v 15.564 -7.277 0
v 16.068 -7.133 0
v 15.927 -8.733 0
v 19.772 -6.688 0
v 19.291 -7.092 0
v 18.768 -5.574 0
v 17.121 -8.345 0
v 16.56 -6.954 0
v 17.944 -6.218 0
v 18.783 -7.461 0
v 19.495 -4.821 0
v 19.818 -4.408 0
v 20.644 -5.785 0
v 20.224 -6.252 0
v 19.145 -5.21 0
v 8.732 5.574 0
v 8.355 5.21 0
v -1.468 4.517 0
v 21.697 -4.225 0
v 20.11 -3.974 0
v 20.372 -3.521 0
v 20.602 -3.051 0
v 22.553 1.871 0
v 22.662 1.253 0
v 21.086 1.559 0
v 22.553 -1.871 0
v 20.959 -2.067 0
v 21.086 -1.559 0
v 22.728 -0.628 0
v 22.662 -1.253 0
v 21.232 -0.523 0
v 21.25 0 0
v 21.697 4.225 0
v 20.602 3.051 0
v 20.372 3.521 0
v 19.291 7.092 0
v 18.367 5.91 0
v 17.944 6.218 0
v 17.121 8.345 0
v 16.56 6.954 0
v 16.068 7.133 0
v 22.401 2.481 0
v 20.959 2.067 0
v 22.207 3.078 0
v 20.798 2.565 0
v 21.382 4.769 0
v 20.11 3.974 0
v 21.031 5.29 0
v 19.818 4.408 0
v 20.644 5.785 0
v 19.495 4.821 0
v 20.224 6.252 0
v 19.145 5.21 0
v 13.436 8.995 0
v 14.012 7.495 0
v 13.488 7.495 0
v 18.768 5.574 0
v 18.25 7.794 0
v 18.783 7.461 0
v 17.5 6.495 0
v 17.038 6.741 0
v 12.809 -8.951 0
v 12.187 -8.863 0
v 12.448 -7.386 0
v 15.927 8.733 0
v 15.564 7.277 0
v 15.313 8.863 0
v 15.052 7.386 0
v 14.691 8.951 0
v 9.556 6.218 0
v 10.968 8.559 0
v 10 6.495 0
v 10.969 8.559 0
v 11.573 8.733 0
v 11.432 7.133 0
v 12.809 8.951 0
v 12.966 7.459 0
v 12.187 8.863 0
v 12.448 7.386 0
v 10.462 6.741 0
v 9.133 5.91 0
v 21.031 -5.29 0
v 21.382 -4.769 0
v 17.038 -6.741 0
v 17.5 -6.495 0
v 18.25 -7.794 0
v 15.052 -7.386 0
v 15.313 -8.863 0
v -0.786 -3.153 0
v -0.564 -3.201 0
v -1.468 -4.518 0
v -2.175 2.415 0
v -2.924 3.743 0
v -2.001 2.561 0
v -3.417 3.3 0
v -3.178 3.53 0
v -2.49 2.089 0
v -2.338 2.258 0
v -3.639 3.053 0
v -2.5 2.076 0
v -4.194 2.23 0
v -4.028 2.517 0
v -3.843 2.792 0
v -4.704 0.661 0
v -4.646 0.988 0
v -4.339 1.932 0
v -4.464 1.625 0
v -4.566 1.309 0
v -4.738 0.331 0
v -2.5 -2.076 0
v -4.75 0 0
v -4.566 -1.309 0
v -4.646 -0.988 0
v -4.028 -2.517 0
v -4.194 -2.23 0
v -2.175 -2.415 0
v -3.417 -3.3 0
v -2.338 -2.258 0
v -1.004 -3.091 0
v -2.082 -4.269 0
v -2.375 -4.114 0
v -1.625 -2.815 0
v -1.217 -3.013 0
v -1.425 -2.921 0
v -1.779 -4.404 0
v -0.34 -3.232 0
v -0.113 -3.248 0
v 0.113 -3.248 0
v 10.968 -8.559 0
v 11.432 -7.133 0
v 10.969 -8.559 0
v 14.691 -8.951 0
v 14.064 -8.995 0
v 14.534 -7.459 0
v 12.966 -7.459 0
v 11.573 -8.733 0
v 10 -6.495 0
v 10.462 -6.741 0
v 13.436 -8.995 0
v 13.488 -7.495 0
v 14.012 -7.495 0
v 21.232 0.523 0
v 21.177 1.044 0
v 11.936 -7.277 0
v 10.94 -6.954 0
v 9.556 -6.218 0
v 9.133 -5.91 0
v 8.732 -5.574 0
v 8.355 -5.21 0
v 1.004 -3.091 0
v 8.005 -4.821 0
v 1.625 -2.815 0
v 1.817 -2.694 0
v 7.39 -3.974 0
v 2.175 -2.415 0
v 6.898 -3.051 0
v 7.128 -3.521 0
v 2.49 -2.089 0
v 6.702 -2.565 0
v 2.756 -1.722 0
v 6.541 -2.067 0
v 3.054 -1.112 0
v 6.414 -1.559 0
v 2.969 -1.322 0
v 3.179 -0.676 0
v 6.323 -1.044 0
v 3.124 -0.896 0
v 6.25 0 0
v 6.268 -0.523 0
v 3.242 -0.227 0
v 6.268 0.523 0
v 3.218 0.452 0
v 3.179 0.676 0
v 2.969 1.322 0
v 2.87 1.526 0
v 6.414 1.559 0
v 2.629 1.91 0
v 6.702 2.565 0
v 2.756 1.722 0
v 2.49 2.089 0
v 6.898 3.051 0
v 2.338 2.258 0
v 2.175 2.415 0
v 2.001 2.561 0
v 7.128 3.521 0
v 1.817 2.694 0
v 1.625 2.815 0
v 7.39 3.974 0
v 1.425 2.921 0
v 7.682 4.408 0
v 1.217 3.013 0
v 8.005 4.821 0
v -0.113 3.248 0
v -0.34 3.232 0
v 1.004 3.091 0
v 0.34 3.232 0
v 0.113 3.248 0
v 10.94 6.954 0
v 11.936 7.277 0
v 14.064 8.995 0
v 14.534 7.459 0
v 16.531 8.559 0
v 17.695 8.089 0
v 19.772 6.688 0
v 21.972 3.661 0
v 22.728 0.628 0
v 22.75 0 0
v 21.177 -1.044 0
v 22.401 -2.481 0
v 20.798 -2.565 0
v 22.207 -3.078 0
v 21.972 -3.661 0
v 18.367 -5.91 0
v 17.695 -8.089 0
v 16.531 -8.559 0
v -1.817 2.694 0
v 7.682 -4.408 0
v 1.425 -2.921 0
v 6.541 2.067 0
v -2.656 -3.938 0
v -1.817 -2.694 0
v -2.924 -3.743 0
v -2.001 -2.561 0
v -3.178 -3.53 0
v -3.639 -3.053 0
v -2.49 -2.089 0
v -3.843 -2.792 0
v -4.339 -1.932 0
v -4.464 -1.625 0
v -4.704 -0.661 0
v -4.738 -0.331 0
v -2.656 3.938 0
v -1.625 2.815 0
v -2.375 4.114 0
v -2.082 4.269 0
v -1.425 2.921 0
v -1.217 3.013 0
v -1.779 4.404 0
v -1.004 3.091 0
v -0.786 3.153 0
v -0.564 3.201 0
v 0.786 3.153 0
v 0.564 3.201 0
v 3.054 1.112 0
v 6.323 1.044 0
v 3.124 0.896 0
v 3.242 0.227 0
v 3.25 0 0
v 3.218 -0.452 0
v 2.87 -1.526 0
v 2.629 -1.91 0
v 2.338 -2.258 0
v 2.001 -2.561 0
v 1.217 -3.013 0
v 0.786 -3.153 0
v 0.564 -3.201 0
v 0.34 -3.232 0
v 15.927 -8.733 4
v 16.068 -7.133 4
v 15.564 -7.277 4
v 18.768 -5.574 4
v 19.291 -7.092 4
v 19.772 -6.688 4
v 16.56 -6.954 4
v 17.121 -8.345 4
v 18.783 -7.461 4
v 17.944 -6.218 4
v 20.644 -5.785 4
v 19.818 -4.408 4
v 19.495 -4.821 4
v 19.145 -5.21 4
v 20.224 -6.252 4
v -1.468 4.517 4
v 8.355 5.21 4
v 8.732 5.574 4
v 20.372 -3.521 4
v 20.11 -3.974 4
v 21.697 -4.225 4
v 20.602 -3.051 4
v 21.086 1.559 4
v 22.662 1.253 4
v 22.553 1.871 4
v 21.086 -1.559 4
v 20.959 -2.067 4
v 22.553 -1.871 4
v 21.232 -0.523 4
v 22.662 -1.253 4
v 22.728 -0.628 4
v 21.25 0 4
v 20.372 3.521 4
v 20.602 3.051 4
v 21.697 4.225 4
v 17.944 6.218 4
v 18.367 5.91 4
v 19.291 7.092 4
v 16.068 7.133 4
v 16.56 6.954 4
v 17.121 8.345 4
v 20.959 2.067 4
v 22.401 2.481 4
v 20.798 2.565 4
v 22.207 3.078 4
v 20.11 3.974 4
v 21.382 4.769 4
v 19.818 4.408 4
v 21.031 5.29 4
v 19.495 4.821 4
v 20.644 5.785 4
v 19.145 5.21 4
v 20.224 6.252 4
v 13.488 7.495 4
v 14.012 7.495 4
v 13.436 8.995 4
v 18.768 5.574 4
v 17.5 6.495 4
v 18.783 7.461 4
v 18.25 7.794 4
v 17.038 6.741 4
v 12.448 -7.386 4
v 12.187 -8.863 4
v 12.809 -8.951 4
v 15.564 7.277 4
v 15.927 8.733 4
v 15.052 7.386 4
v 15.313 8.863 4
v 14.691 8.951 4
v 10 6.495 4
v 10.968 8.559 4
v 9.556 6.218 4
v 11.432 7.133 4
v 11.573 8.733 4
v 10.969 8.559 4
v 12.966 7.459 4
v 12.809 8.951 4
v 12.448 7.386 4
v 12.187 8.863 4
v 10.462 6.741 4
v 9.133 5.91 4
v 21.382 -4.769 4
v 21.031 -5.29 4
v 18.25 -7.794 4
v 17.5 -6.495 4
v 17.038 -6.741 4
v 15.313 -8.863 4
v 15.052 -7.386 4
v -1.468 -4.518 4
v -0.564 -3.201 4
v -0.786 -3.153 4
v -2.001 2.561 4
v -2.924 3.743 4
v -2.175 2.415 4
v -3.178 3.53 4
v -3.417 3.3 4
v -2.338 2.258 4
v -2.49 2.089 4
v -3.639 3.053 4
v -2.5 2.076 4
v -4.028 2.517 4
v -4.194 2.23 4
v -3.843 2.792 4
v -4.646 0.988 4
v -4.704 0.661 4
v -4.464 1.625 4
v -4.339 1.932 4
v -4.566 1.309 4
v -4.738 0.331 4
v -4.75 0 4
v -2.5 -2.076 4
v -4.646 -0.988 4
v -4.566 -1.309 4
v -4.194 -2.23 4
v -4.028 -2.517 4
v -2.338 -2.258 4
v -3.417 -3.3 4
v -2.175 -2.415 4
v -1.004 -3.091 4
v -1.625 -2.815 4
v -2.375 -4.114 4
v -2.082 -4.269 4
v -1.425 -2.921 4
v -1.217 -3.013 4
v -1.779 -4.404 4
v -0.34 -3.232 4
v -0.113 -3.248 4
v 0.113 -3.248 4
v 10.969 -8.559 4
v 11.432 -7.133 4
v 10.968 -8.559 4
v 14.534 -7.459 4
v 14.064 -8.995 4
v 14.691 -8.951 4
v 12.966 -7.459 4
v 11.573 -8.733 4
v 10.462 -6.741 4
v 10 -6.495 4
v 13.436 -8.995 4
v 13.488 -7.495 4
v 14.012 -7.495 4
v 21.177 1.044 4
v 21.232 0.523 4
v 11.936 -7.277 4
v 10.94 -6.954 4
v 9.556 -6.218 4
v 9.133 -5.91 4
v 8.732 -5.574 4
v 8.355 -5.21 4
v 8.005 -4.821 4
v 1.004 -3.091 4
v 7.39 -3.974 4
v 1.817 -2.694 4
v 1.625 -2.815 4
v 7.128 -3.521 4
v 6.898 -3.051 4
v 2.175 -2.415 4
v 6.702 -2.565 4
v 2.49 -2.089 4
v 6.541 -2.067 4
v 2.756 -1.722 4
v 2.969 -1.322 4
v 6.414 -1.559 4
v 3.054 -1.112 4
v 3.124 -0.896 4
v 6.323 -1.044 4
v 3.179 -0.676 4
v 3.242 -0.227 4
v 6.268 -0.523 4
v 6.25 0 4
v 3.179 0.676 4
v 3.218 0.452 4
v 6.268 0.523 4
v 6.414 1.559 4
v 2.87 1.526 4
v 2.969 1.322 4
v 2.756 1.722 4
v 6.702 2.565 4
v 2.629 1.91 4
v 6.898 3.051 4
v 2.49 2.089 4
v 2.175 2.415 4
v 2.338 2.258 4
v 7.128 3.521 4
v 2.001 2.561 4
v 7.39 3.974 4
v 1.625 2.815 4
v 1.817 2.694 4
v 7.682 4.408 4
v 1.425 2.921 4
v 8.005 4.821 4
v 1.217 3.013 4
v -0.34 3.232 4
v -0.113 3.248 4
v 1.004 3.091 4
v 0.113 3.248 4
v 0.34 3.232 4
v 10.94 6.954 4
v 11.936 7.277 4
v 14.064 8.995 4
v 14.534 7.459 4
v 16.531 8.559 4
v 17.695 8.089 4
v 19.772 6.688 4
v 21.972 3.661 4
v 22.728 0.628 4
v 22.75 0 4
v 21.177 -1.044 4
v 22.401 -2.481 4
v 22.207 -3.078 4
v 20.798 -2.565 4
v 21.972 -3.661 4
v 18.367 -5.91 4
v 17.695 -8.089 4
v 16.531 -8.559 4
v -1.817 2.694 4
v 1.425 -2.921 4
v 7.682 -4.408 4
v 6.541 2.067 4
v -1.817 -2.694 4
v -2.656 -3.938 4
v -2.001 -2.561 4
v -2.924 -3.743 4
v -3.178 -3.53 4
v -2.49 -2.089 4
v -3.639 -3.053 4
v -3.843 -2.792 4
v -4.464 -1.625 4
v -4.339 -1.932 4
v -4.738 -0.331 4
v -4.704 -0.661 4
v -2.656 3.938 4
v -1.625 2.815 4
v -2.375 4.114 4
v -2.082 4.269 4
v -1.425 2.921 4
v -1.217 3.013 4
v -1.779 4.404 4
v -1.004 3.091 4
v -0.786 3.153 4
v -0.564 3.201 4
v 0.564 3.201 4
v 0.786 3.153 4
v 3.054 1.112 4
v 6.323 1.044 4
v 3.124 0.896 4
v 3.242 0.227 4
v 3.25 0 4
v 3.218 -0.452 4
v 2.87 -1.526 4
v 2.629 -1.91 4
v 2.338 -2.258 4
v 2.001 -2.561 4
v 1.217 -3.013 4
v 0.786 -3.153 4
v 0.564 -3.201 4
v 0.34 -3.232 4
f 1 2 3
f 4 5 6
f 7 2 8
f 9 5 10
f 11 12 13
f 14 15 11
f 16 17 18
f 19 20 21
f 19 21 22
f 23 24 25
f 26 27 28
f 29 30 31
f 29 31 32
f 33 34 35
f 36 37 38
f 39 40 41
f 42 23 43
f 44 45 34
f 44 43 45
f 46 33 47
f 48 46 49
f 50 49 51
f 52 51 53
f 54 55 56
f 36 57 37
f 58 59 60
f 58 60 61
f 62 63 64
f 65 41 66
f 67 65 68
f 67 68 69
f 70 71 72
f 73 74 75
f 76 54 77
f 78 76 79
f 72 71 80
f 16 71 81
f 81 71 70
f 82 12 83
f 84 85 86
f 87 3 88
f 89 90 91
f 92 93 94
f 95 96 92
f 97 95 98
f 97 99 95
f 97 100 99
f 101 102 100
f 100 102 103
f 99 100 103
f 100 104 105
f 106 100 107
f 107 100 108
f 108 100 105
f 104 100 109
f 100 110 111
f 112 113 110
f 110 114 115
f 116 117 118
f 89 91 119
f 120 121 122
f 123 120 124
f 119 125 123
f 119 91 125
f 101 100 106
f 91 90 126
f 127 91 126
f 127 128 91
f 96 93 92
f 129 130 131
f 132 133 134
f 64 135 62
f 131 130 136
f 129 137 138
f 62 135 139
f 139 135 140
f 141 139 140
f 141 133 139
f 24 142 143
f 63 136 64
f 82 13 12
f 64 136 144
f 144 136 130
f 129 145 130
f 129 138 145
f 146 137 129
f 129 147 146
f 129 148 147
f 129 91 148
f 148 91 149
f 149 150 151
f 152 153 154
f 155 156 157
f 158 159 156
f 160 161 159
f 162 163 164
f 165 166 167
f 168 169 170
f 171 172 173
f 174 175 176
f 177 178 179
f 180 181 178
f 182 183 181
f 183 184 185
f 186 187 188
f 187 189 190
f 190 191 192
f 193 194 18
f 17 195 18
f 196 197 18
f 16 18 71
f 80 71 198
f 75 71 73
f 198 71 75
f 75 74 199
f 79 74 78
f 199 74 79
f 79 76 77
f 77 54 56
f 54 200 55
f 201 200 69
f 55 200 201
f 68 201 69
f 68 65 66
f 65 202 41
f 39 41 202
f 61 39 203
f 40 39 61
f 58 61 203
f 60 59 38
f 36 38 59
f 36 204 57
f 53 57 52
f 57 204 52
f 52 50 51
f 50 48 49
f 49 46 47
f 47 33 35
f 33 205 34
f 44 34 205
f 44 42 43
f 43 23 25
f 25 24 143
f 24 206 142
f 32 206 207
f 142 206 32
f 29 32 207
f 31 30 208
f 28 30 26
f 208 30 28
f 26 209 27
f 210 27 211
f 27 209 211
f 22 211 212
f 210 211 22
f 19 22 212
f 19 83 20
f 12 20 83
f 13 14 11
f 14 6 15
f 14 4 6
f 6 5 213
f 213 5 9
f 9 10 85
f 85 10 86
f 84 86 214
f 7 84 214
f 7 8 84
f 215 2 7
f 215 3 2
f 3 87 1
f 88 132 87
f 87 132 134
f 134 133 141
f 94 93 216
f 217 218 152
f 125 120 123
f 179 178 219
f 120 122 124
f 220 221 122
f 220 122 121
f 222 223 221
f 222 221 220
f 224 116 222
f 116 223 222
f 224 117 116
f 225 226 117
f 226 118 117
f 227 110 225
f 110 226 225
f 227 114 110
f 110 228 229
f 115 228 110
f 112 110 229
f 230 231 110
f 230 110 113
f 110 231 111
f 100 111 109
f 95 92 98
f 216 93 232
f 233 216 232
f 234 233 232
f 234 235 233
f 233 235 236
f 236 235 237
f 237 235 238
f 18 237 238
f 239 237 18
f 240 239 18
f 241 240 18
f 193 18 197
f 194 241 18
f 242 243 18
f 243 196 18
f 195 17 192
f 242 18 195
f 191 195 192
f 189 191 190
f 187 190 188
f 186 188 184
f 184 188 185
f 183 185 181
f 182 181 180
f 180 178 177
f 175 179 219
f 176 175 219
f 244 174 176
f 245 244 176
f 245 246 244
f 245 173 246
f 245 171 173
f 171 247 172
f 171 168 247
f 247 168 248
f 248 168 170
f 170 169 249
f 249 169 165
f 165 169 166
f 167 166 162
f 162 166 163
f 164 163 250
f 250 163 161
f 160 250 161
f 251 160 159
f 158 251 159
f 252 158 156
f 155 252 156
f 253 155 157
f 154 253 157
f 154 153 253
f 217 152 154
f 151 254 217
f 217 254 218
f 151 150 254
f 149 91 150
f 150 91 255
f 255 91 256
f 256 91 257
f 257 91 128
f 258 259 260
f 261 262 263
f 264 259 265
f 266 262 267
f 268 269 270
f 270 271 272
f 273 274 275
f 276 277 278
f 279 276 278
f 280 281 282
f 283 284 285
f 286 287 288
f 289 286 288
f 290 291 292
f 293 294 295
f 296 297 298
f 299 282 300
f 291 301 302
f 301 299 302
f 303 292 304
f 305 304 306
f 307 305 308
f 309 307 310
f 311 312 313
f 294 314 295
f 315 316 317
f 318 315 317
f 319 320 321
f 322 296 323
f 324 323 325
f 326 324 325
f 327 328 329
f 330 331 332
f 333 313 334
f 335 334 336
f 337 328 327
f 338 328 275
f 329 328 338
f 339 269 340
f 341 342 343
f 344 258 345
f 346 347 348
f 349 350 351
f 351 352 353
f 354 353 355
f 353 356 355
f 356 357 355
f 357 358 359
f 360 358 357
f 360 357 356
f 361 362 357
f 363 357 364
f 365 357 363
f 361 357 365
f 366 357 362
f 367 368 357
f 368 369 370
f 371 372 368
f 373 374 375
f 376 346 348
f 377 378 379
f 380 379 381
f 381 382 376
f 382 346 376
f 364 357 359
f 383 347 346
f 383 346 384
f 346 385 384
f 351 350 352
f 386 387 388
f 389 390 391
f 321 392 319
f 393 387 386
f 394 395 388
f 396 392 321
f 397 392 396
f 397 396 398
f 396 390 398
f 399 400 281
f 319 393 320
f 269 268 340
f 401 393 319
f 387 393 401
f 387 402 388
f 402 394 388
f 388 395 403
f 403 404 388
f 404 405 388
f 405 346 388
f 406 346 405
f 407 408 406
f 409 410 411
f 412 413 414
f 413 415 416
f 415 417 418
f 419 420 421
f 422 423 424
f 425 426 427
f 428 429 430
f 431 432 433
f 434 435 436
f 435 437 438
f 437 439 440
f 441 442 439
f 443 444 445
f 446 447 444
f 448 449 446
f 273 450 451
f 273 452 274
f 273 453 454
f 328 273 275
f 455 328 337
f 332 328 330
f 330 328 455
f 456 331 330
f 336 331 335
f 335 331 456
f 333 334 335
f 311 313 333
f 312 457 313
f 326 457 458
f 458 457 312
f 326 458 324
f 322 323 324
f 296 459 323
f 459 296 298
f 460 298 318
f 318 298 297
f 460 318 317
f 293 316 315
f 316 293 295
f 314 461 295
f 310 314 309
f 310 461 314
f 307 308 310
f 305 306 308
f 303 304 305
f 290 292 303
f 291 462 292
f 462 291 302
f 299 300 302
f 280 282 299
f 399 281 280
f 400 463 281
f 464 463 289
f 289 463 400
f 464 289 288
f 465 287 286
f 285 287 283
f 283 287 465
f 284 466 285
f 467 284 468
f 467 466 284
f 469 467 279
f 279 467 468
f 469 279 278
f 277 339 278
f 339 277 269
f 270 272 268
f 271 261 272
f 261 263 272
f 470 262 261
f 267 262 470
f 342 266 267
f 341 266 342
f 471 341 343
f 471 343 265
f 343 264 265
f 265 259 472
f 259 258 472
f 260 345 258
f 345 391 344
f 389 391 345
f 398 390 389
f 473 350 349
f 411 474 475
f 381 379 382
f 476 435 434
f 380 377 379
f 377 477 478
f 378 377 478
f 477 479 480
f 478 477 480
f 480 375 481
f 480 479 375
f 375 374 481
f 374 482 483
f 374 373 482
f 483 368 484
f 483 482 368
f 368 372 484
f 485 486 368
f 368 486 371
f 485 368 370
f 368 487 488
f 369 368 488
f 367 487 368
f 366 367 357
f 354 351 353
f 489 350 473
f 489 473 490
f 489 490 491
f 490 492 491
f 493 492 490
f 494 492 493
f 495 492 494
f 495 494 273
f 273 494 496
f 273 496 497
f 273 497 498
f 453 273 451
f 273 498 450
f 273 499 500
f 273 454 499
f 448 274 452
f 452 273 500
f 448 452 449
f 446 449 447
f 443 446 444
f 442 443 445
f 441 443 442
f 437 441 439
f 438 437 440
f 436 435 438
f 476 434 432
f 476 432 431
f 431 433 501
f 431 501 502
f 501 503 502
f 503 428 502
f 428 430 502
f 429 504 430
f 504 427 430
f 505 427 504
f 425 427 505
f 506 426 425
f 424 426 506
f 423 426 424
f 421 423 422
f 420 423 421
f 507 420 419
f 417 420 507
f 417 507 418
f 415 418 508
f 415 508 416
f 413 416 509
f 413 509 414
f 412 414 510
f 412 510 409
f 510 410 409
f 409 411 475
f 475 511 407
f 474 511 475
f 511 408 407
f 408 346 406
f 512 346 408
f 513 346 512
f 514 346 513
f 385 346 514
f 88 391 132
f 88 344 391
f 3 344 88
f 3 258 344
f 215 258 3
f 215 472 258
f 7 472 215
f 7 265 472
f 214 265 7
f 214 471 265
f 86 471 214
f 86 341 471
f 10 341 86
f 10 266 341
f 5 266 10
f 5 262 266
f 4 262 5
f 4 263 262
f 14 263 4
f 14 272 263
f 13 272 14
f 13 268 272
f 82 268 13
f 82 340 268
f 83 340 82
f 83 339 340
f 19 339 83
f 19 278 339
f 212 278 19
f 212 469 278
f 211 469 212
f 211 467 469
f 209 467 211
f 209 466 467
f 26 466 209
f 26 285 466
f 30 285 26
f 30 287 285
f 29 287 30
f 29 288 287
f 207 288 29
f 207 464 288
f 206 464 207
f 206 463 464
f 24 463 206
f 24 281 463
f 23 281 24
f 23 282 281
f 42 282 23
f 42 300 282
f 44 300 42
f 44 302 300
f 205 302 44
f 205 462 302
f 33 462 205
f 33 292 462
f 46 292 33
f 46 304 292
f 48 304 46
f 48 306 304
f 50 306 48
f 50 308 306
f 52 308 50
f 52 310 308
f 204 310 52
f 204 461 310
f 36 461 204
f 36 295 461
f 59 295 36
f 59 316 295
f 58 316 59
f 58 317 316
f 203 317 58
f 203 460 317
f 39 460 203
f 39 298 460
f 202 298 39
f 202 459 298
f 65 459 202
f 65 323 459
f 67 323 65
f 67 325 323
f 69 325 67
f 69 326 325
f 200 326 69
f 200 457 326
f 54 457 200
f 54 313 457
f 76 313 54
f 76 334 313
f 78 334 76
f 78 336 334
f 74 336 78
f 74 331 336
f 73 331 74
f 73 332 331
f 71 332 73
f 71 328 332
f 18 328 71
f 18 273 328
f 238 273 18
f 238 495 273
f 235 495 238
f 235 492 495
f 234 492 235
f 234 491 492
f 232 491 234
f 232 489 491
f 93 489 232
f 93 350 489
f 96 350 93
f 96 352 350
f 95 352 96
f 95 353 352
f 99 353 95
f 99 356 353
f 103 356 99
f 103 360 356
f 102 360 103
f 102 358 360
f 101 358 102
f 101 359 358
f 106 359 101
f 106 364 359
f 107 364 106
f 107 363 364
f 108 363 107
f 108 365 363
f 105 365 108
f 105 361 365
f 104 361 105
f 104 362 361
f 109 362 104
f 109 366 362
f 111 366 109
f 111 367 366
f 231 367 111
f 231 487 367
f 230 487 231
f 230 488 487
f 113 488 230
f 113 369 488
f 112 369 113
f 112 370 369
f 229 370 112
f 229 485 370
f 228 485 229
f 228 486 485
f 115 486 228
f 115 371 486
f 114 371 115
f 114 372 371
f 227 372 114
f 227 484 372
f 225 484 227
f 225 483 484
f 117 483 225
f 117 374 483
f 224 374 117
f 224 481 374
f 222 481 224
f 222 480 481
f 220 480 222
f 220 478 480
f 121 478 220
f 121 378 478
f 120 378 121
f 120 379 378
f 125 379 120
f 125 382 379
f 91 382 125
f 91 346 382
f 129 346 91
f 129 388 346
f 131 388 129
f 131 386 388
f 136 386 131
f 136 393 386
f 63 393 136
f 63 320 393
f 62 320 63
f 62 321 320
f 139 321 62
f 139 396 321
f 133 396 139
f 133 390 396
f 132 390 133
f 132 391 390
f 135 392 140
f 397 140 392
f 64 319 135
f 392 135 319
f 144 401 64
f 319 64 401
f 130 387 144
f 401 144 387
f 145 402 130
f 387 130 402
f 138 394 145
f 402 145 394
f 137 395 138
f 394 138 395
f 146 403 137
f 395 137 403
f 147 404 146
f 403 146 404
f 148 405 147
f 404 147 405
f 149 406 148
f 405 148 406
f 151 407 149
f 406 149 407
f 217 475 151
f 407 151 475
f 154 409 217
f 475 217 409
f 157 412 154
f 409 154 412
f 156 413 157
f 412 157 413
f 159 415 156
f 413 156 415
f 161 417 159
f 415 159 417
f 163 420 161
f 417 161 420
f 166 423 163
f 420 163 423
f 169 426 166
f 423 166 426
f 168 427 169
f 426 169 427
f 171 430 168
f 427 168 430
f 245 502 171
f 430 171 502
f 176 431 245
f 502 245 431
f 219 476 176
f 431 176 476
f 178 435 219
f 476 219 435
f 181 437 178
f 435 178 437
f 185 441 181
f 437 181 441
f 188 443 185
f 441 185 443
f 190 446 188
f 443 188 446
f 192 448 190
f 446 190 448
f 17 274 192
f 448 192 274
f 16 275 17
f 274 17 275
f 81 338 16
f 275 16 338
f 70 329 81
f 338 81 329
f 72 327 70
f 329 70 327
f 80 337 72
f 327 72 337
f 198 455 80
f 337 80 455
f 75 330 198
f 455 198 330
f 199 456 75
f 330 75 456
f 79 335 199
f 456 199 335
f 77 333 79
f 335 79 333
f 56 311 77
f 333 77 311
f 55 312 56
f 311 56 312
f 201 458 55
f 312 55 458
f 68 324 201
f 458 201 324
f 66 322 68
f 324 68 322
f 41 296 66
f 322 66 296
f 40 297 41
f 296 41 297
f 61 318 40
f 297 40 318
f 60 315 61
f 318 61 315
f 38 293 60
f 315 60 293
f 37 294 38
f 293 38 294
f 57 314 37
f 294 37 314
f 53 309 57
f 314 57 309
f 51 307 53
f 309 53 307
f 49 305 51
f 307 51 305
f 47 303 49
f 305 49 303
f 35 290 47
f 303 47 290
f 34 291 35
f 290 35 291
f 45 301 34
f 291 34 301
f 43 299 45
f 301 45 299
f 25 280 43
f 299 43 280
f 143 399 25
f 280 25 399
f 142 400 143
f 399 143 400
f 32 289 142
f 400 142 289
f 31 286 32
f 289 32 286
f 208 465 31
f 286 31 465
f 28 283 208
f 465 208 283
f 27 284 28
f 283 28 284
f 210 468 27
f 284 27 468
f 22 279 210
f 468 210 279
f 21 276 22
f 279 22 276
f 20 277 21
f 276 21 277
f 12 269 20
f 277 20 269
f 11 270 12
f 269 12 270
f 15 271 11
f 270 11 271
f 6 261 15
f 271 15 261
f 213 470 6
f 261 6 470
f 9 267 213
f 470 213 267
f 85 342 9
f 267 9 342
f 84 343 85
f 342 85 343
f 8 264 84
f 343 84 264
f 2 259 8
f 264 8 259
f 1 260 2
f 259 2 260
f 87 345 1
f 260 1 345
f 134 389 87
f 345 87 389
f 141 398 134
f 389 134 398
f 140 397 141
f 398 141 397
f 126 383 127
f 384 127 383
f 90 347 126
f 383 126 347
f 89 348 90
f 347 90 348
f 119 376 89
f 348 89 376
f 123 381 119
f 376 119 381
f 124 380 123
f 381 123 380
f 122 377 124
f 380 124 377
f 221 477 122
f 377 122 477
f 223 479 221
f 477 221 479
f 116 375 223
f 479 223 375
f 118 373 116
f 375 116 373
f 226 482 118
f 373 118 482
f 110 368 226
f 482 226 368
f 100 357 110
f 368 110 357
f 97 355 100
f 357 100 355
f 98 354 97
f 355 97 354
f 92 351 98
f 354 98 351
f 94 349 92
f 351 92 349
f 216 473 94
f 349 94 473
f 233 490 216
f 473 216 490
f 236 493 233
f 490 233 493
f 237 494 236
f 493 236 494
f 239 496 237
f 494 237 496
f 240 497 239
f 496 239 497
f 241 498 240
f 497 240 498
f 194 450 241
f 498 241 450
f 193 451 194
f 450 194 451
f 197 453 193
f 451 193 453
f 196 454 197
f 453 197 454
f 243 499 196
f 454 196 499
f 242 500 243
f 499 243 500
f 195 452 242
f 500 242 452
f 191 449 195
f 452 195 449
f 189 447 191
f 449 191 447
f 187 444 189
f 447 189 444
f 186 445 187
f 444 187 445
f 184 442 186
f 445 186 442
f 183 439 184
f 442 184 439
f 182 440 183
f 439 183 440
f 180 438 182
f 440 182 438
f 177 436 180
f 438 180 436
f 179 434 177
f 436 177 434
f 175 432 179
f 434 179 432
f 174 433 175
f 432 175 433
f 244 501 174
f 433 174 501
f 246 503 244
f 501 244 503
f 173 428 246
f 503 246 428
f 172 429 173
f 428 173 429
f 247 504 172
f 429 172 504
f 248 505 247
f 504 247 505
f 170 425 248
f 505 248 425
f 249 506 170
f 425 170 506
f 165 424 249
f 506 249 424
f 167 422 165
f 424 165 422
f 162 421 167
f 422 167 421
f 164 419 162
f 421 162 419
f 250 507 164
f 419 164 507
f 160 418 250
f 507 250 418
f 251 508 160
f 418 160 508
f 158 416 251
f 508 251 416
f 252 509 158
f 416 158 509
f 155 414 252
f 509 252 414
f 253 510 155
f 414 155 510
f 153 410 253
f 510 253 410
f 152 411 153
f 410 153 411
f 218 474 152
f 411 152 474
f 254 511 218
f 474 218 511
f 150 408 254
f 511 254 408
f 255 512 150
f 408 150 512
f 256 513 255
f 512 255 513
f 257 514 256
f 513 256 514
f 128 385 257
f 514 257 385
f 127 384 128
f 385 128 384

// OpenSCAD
/*

 small part for a VO&S Spinnewiel:
 it's an eyelet to slide along the flight in
 order to collect the spun yarn on the bobbin

 You probably want to balance the flight with a few
 M7 washers and keep them in their place with 2 eyelets

 there are 2 modules, outline() and punchout()
 outline describes the outerform, punchout describes
 the holes to be punched out.

 Then punchout is subtracted from outline and the result
 is given thickness.
*/

$fn=90;

// flight is 6.5mm with a .5mm flat edge ground
// on one side. It keeps the eyelet straight
vlucht_dia=6.5;
vlucht_vlak=.5;

hoogte=4;

// bus schuift over vlucht
bus_dikte=3;
bus_id=vlucht_dia;
bus_od=bus_id+bus_dikte;

// define eye for the yarn
// same as the the bus, but you can change it
ring_dikte=bus_dikte;
ring_id=15;
ring_od=ring_id+ring_dikte;

// center 2 center is used so much it's
// earned its own variable
c2c = (bus_od+ring_od)/2;

// create the eyelet: lay down the outline, punch a few holes
// and extrude it a bit
linear_extrude(height=hoogte, center=false, convexity=10) {
    difference() {
        outline();
        punchout();
    }
}

module punchout() {
    // flight: vlucht
    intersection() {
        circle(d=vlucht_dia);
        // the flight has a flat side to register
        translate([vlucht_vlak,0])
            square(
                [vlucht_dia-vlucht_vlak,vlucht_dia],
                center=true);
    }
    // ring for the yarn
    translate([c2c,0])
        circle(d=ring_id);
}

module outline() {
    circle(d=bus_od);
    translate([c2c,0])
        circle(d=ring_od);

    // create a nice filler between the
    // 2 circles
    //
    // adapted from
    // https://unixwars.blogspot.com/2016/03/joining-two-circlescylinders-in.html
    r1 = bus_od/2;
    r2 = ring_od/2;

    alpha = asin((r2-r1)/(r2+r1));
    x1 = r1*sin(alpha);
    y1 = r1*cos(alpha);
    x2 = c2c-r2*sin(alpha);
    y2 = r2*cos(alpha);

    point0 = [-x1,-y1];
    point1 = [-x1,y1];
    point2 = [x2,y2];
    point3 = [x2,-y2];
    
    polygon(
        points=[
            point0,
            point1,
            point2,
            point3],
        paths=[[0,1,2,3]]);
}
